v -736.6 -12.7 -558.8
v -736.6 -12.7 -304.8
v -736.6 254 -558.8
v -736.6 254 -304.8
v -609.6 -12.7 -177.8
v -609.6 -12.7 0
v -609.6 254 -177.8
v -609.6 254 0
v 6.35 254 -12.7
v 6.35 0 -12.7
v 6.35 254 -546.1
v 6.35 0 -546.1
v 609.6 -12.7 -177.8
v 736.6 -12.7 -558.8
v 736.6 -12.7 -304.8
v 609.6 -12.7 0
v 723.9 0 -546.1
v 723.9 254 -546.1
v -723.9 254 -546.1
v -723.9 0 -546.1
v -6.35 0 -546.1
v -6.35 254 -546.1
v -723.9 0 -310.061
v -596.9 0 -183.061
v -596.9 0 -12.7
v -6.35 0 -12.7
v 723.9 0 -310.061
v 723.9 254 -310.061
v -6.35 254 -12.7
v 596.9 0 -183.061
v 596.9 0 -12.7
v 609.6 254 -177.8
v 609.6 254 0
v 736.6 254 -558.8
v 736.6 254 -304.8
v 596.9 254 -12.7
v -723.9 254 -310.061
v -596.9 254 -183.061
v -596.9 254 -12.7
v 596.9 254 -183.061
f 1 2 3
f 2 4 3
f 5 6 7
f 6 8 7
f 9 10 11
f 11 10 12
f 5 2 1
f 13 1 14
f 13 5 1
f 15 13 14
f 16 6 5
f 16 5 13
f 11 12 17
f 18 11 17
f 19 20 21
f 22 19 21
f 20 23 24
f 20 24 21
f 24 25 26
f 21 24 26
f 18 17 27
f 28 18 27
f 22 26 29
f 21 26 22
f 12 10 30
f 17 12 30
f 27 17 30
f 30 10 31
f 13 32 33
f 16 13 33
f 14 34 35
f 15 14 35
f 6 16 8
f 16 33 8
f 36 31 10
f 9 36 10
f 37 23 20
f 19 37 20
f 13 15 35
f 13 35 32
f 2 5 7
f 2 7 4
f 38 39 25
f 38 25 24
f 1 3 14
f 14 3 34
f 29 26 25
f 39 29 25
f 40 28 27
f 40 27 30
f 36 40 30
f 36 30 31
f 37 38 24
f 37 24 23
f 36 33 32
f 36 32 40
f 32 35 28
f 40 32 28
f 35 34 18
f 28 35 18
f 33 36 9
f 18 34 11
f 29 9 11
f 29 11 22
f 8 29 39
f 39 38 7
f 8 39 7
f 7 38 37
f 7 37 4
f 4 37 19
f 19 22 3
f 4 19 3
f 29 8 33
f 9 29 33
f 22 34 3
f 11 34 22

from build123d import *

# Parameters (mm, degrees)
BOSS_EXTRUDE1_DEPTH = 254
BOSS_EXTRUDE2_DEPTH = 12.7
SKETCH3_W           = 12.7
SKETCH3_H           = 533.4
BOSS_EXTRUDE3_DEPTH = 254


with BuildPart() as part:
    # Sketch1 → Boss-Extrude1 (new body)
    with BuildSketch(Plane(origin=(0, 0, 0), x_dir=(1, 0, 0), z_dir=(0, 1, 0))):
        Polygon((0, 0), (-609.6, 0), (-609.6, 177.8), (-736.6, 304.8), (-736.6, 558.8), (736.6, 558.8), (736.6, 304.8), (609.6, 177.8), (609.6, 0), align=None)
        Polygon((-723.9, 310.060512242), (-723.9, 546.1), (723.9, 546.1), (723.9, 310.060512242), (596.9, 183.060512242), (596.9, 12.7), (0, 12.7), (-596.9, 12.7), (-596.9, 183.060512242), align=None, mode=Mode.SUBTRACT)
    extrude(amount=BOSS_EXTRUDE1_DEPTH)

    # Sketch2 → Boss-Extrude2 (add)
    with BuildSketch(Plane.XZ):
        Polygon((609.6, -177.8), (609.6, 0), (-609.6, 0), (-609.6, -177.8), (-736.6, -304.8), (-736.6, -558.8), (736.6, -558.8), (736.6, -304.8), align=None)
    extrude(amount=BOSS_EXTRUDE2_DEPTH)

    # Sketch3 → Boss-Extrude3 (add)
    with BuildSketch(Plane(origin=(0, 0, 0), x_dir=(1, 0, 0), z_dir=(0, 1, 0))):
        with Locations((0, 279.4)):
            Rectangle(SKETCH3_W, SKETCH3_H)
    extrude(amount=BOSS_EXTRUDE3_DEPTH)


solid = part.part
